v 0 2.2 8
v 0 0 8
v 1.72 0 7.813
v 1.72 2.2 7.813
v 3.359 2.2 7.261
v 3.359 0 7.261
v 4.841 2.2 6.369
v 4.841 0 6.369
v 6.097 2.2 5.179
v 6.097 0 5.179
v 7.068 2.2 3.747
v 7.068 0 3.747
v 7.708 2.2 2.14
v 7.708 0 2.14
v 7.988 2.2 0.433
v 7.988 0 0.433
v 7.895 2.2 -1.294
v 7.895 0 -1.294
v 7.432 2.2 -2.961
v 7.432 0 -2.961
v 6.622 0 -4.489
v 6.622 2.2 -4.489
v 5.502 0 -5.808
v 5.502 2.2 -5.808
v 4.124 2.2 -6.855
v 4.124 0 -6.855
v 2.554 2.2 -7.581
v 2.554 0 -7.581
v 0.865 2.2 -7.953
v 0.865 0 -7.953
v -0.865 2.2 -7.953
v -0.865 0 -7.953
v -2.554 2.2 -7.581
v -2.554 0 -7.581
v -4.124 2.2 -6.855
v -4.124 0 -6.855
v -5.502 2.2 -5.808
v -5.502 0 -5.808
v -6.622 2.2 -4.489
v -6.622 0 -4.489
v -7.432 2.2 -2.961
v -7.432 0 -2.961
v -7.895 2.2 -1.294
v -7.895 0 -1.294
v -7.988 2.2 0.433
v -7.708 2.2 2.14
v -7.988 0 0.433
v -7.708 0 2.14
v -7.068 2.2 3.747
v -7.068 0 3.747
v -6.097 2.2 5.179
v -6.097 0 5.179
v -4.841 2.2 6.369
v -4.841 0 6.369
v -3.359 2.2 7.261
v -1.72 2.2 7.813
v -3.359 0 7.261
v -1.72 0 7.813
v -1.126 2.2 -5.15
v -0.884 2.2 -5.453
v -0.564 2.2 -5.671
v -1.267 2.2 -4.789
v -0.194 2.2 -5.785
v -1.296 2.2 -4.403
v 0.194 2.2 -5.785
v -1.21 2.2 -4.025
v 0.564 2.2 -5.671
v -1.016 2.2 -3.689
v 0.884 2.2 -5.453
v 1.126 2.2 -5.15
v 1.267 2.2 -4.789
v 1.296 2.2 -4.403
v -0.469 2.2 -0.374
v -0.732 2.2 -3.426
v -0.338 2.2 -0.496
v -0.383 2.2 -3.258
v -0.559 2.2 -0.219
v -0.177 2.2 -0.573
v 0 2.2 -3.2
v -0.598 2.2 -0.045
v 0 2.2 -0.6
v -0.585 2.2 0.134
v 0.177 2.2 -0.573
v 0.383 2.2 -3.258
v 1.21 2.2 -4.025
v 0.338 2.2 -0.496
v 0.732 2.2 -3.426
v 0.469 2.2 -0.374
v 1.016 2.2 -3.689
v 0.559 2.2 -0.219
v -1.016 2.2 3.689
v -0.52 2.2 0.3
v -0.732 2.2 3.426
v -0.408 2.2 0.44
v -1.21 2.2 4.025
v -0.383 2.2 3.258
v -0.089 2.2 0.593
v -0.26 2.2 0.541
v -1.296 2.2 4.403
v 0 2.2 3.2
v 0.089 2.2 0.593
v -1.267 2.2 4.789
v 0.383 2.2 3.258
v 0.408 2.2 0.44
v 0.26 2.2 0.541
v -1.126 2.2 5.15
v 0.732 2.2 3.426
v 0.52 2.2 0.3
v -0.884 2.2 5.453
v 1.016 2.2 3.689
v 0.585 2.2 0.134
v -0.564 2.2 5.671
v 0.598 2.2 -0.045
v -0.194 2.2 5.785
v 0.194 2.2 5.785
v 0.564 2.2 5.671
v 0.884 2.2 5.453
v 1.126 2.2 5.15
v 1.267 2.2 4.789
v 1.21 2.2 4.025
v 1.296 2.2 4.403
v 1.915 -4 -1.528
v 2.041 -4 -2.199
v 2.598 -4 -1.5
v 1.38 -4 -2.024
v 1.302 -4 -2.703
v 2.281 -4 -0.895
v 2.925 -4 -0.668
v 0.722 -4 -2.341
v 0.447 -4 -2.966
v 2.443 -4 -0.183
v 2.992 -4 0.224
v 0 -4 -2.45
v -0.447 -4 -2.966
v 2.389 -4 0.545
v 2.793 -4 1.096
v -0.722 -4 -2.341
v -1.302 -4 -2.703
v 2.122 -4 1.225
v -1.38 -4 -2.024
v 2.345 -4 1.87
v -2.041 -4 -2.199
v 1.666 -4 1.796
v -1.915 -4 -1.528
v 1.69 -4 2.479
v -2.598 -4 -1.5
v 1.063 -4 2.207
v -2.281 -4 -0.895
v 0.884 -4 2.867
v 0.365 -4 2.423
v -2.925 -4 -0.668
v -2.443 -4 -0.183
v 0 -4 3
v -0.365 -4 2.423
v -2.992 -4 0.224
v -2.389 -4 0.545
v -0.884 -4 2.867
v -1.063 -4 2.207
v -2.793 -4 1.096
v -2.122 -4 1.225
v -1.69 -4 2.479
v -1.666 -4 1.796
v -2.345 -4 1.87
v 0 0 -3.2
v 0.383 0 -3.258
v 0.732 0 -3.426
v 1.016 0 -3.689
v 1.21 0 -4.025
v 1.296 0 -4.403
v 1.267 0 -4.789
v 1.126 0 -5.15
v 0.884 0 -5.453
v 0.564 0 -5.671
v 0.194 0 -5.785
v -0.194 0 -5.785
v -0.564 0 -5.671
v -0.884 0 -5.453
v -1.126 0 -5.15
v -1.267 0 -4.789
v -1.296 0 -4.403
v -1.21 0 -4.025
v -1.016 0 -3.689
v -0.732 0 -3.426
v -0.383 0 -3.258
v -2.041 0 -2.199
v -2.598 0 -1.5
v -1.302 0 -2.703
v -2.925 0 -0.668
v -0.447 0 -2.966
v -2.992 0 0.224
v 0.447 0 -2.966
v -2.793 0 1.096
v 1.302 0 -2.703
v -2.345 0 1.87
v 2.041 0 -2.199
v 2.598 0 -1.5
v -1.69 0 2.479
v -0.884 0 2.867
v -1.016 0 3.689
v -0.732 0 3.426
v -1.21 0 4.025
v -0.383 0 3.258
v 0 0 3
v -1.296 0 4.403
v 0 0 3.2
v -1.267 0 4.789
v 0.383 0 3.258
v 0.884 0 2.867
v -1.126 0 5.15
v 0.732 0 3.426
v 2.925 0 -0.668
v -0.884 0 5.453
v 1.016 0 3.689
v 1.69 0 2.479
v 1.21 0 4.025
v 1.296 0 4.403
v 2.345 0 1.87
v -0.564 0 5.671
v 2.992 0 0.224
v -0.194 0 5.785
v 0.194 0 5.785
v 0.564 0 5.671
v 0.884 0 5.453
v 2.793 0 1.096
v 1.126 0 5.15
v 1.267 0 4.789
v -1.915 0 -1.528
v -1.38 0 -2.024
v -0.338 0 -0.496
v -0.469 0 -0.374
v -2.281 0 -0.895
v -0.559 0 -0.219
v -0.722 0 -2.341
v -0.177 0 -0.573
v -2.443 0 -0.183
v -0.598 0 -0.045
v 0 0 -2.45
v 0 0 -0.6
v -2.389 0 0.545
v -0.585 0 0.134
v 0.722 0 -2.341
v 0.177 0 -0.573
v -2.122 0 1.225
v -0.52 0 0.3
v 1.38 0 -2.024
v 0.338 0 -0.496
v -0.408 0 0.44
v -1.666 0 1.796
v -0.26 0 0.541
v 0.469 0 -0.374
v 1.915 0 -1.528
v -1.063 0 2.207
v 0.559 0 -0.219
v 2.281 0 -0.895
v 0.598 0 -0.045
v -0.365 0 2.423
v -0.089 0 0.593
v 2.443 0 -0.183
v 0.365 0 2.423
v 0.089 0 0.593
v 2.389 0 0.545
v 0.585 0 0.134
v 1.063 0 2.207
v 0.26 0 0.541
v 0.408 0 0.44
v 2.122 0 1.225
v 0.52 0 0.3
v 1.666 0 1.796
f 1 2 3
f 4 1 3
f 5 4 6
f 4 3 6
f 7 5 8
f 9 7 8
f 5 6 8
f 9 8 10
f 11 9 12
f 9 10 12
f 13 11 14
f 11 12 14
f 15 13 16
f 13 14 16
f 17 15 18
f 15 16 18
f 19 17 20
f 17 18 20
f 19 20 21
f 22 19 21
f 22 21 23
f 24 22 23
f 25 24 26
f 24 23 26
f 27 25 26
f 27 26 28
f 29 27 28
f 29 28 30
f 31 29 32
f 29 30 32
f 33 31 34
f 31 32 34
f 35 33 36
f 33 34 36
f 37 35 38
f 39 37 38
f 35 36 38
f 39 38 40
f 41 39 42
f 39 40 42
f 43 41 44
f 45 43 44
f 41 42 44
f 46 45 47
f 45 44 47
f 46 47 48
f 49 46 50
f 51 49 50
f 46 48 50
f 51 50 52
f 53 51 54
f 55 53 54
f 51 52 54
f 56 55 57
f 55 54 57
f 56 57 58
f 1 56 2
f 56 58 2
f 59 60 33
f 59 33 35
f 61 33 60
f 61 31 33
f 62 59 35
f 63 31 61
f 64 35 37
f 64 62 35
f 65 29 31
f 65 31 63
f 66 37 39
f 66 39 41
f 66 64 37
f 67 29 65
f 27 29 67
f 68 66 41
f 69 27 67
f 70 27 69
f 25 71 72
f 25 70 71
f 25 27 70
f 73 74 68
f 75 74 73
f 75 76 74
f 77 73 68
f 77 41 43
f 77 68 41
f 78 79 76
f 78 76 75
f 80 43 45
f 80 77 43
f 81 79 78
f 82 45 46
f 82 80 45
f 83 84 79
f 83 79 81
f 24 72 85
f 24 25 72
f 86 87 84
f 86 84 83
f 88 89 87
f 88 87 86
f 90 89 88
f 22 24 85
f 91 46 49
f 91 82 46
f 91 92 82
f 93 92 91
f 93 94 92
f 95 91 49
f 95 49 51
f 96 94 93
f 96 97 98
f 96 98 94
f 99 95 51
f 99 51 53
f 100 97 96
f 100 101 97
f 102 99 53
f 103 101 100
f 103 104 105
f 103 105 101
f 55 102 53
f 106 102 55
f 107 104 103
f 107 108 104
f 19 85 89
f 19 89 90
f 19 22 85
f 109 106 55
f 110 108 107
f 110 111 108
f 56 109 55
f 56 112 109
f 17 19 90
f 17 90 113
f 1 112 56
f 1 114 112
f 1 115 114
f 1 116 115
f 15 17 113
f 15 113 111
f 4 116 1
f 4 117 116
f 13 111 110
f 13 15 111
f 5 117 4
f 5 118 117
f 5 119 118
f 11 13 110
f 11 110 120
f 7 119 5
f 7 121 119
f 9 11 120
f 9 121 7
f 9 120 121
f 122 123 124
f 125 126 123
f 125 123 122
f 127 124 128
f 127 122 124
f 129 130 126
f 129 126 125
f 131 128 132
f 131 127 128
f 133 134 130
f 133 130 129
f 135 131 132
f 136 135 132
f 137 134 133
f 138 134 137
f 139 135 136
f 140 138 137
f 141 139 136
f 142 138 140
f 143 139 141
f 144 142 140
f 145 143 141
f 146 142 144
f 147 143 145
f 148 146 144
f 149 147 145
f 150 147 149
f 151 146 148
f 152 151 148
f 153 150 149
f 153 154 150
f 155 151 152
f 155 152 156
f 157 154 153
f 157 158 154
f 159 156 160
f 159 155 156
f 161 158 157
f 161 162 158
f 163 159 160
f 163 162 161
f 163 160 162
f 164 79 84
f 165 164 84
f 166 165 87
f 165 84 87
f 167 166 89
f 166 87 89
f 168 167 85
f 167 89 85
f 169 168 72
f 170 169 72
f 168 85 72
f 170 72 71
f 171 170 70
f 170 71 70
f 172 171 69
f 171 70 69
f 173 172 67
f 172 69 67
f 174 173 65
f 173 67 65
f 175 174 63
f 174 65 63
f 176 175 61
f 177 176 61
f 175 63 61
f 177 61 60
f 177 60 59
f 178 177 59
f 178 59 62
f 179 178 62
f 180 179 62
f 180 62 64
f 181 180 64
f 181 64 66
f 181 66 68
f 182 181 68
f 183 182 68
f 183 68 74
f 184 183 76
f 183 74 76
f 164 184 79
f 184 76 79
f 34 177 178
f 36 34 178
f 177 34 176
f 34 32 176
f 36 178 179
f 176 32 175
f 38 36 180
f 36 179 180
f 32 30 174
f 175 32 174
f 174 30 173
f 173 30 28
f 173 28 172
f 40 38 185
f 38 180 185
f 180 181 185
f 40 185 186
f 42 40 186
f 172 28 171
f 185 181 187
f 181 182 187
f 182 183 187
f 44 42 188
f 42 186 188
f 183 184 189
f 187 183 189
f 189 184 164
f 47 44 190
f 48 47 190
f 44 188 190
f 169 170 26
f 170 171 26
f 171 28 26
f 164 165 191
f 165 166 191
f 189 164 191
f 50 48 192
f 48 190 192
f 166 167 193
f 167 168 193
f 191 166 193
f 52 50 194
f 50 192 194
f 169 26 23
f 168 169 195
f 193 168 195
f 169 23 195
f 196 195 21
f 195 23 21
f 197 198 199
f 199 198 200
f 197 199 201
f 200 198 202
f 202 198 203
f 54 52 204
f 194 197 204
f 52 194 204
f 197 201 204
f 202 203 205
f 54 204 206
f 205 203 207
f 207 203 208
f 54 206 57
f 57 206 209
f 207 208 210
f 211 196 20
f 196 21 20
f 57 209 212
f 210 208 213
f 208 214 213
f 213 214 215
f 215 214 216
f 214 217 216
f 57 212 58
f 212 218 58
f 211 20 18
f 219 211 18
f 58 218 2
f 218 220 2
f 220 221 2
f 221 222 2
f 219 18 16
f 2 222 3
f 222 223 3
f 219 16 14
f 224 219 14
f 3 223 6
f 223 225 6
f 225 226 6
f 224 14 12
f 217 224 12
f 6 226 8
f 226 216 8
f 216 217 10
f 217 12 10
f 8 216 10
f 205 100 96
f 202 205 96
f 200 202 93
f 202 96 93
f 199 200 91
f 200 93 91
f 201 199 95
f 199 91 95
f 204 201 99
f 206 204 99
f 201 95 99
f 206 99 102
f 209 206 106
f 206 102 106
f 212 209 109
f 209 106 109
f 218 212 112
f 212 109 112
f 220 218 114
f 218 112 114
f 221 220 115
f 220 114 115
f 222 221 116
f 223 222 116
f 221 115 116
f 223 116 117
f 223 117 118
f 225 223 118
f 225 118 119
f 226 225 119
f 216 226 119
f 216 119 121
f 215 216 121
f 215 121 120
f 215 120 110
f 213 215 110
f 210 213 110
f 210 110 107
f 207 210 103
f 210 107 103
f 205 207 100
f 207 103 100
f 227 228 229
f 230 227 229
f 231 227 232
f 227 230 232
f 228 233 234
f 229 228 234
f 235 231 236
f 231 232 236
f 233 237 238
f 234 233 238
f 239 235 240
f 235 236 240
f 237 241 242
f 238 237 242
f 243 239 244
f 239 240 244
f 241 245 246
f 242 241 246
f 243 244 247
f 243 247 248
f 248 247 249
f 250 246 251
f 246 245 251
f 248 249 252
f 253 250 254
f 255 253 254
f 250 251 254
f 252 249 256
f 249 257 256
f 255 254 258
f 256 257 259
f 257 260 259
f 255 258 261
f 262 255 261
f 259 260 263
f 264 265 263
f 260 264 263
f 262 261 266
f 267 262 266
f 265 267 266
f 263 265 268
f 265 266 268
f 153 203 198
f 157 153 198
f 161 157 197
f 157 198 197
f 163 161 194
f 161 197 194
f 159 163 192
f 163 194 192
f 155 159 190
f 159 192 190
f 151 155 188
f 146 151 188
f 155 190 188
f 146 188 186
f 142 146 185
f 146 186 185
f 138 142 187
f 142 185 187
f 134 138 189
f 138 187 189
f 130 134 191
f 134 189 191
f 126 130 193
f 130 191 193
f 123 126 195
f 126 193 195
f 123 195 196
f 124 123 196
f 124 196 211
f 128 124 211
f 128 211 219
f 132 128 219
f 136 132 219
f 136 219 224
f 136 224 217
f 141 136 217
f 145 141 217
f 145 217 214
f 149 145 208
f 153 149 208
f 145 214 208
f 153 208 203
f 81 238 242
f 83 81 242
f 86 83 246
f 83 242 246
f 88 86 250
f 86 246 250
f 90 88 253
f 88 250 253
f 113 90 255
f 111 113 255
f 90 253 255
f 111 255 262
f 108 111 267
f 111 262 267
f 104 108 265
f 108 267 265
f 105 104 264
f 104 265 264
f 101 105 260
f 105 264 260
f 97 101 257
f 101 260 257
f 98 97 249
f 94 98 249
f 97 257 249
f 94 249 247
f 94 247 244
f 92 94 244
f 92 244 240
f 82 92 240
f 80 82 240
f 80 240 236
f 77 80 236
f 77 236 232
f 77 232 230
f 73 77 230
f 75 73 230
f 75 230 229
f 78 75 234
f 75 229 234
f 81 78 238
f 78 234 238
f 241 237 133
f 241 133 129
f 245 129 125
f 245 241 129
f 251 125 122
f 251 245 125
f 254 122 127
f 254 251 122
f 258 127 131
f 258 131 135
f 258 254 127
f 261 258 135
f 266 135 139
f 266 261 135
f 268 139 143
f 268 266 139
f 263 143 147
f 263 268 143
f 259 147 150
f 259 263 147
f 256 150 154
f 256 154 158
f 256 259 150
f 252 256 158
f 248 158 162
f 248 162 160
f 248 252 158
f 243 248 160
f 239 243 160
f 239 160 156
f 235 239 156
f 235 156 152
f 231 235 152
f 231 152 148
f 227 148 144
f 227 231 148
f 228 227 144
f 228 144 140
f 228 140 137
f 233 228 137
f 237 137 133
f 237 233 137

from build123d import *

# Parameters (mm, degrees)
SKETCH1_R           = 8
BOSS_EXTRUDE1_DEPTH = 2.2
SKETCH2_R           = 1.3
CUT_EXTRUDE1_DEPTH  = 2.2
SKETCH3_R           = 3
SKETCH3_R_2         = 2.45
BOSS_EXTRUDE2_DEPTH = 4
SKETCH8_R           = 0.6
CUT_EXTRUDE7_DEPTH  = 2.2


with BuildPart() as part:
    # Sketch1 → Boss-Extrude1 (new body)
    with BuildSketch(Plane(origin=(0, 0, 0), x_dir=(1, 0, 0), z_dir=(0, 1, 0))):
        with Locations(Location((0, 0, 0), (0, 0, 270))):
            Circle(SKETCH1_R)
    extrude(amount=BOSS_EXTRUDE1_DEPTH)

    # Sketch2 → Cut-Extrude1 (cut)
    with BuildSketch(Plane(origin=(0, 2.2, 0), x_dir=(1, 0, 0), z_dir=(0, 1, 0))):
        with Locations(Location((0, 4.5, 0), (0, 0, 270))):
            Circle(SKETCH2_R)
        with Locations(Location((0, -4.5, 0), (0, 0, 90))):
            Circle(SKETCH2_R)
    extrude(amount=-CUT_EXTRUDE1_DEPTH, mode=Mode.SUBTRACT)

    # Sketch3 → Boss-Extrude2 (add)
    with BuildSketch(Plane.XZ):
        with Locations(Location((0, 0, 0), (0, 0, 90))):
            Circle(SKETCH3_R)
        with Locations(Location((0, 0, 0), (0, 0, 270))):
            Circle(SKETCH3_R_2, mode=Mode.SUBTRACT)
    extrude(amount=BOSS_EXTRUDE2_DEPTH)

    # Sketch8 → Cut-Extrude7 (cut)
    with BuildSketch(Plane.XZ):
        with Locations(Location((0, 0, 0), (0, 0, 270))):
            Circle(SKETCH8_R)
    extrude(amount=-CUT_EXTRUDE7_DEPTH, mode=Mode.SUBTRACT)


solid = part.part
